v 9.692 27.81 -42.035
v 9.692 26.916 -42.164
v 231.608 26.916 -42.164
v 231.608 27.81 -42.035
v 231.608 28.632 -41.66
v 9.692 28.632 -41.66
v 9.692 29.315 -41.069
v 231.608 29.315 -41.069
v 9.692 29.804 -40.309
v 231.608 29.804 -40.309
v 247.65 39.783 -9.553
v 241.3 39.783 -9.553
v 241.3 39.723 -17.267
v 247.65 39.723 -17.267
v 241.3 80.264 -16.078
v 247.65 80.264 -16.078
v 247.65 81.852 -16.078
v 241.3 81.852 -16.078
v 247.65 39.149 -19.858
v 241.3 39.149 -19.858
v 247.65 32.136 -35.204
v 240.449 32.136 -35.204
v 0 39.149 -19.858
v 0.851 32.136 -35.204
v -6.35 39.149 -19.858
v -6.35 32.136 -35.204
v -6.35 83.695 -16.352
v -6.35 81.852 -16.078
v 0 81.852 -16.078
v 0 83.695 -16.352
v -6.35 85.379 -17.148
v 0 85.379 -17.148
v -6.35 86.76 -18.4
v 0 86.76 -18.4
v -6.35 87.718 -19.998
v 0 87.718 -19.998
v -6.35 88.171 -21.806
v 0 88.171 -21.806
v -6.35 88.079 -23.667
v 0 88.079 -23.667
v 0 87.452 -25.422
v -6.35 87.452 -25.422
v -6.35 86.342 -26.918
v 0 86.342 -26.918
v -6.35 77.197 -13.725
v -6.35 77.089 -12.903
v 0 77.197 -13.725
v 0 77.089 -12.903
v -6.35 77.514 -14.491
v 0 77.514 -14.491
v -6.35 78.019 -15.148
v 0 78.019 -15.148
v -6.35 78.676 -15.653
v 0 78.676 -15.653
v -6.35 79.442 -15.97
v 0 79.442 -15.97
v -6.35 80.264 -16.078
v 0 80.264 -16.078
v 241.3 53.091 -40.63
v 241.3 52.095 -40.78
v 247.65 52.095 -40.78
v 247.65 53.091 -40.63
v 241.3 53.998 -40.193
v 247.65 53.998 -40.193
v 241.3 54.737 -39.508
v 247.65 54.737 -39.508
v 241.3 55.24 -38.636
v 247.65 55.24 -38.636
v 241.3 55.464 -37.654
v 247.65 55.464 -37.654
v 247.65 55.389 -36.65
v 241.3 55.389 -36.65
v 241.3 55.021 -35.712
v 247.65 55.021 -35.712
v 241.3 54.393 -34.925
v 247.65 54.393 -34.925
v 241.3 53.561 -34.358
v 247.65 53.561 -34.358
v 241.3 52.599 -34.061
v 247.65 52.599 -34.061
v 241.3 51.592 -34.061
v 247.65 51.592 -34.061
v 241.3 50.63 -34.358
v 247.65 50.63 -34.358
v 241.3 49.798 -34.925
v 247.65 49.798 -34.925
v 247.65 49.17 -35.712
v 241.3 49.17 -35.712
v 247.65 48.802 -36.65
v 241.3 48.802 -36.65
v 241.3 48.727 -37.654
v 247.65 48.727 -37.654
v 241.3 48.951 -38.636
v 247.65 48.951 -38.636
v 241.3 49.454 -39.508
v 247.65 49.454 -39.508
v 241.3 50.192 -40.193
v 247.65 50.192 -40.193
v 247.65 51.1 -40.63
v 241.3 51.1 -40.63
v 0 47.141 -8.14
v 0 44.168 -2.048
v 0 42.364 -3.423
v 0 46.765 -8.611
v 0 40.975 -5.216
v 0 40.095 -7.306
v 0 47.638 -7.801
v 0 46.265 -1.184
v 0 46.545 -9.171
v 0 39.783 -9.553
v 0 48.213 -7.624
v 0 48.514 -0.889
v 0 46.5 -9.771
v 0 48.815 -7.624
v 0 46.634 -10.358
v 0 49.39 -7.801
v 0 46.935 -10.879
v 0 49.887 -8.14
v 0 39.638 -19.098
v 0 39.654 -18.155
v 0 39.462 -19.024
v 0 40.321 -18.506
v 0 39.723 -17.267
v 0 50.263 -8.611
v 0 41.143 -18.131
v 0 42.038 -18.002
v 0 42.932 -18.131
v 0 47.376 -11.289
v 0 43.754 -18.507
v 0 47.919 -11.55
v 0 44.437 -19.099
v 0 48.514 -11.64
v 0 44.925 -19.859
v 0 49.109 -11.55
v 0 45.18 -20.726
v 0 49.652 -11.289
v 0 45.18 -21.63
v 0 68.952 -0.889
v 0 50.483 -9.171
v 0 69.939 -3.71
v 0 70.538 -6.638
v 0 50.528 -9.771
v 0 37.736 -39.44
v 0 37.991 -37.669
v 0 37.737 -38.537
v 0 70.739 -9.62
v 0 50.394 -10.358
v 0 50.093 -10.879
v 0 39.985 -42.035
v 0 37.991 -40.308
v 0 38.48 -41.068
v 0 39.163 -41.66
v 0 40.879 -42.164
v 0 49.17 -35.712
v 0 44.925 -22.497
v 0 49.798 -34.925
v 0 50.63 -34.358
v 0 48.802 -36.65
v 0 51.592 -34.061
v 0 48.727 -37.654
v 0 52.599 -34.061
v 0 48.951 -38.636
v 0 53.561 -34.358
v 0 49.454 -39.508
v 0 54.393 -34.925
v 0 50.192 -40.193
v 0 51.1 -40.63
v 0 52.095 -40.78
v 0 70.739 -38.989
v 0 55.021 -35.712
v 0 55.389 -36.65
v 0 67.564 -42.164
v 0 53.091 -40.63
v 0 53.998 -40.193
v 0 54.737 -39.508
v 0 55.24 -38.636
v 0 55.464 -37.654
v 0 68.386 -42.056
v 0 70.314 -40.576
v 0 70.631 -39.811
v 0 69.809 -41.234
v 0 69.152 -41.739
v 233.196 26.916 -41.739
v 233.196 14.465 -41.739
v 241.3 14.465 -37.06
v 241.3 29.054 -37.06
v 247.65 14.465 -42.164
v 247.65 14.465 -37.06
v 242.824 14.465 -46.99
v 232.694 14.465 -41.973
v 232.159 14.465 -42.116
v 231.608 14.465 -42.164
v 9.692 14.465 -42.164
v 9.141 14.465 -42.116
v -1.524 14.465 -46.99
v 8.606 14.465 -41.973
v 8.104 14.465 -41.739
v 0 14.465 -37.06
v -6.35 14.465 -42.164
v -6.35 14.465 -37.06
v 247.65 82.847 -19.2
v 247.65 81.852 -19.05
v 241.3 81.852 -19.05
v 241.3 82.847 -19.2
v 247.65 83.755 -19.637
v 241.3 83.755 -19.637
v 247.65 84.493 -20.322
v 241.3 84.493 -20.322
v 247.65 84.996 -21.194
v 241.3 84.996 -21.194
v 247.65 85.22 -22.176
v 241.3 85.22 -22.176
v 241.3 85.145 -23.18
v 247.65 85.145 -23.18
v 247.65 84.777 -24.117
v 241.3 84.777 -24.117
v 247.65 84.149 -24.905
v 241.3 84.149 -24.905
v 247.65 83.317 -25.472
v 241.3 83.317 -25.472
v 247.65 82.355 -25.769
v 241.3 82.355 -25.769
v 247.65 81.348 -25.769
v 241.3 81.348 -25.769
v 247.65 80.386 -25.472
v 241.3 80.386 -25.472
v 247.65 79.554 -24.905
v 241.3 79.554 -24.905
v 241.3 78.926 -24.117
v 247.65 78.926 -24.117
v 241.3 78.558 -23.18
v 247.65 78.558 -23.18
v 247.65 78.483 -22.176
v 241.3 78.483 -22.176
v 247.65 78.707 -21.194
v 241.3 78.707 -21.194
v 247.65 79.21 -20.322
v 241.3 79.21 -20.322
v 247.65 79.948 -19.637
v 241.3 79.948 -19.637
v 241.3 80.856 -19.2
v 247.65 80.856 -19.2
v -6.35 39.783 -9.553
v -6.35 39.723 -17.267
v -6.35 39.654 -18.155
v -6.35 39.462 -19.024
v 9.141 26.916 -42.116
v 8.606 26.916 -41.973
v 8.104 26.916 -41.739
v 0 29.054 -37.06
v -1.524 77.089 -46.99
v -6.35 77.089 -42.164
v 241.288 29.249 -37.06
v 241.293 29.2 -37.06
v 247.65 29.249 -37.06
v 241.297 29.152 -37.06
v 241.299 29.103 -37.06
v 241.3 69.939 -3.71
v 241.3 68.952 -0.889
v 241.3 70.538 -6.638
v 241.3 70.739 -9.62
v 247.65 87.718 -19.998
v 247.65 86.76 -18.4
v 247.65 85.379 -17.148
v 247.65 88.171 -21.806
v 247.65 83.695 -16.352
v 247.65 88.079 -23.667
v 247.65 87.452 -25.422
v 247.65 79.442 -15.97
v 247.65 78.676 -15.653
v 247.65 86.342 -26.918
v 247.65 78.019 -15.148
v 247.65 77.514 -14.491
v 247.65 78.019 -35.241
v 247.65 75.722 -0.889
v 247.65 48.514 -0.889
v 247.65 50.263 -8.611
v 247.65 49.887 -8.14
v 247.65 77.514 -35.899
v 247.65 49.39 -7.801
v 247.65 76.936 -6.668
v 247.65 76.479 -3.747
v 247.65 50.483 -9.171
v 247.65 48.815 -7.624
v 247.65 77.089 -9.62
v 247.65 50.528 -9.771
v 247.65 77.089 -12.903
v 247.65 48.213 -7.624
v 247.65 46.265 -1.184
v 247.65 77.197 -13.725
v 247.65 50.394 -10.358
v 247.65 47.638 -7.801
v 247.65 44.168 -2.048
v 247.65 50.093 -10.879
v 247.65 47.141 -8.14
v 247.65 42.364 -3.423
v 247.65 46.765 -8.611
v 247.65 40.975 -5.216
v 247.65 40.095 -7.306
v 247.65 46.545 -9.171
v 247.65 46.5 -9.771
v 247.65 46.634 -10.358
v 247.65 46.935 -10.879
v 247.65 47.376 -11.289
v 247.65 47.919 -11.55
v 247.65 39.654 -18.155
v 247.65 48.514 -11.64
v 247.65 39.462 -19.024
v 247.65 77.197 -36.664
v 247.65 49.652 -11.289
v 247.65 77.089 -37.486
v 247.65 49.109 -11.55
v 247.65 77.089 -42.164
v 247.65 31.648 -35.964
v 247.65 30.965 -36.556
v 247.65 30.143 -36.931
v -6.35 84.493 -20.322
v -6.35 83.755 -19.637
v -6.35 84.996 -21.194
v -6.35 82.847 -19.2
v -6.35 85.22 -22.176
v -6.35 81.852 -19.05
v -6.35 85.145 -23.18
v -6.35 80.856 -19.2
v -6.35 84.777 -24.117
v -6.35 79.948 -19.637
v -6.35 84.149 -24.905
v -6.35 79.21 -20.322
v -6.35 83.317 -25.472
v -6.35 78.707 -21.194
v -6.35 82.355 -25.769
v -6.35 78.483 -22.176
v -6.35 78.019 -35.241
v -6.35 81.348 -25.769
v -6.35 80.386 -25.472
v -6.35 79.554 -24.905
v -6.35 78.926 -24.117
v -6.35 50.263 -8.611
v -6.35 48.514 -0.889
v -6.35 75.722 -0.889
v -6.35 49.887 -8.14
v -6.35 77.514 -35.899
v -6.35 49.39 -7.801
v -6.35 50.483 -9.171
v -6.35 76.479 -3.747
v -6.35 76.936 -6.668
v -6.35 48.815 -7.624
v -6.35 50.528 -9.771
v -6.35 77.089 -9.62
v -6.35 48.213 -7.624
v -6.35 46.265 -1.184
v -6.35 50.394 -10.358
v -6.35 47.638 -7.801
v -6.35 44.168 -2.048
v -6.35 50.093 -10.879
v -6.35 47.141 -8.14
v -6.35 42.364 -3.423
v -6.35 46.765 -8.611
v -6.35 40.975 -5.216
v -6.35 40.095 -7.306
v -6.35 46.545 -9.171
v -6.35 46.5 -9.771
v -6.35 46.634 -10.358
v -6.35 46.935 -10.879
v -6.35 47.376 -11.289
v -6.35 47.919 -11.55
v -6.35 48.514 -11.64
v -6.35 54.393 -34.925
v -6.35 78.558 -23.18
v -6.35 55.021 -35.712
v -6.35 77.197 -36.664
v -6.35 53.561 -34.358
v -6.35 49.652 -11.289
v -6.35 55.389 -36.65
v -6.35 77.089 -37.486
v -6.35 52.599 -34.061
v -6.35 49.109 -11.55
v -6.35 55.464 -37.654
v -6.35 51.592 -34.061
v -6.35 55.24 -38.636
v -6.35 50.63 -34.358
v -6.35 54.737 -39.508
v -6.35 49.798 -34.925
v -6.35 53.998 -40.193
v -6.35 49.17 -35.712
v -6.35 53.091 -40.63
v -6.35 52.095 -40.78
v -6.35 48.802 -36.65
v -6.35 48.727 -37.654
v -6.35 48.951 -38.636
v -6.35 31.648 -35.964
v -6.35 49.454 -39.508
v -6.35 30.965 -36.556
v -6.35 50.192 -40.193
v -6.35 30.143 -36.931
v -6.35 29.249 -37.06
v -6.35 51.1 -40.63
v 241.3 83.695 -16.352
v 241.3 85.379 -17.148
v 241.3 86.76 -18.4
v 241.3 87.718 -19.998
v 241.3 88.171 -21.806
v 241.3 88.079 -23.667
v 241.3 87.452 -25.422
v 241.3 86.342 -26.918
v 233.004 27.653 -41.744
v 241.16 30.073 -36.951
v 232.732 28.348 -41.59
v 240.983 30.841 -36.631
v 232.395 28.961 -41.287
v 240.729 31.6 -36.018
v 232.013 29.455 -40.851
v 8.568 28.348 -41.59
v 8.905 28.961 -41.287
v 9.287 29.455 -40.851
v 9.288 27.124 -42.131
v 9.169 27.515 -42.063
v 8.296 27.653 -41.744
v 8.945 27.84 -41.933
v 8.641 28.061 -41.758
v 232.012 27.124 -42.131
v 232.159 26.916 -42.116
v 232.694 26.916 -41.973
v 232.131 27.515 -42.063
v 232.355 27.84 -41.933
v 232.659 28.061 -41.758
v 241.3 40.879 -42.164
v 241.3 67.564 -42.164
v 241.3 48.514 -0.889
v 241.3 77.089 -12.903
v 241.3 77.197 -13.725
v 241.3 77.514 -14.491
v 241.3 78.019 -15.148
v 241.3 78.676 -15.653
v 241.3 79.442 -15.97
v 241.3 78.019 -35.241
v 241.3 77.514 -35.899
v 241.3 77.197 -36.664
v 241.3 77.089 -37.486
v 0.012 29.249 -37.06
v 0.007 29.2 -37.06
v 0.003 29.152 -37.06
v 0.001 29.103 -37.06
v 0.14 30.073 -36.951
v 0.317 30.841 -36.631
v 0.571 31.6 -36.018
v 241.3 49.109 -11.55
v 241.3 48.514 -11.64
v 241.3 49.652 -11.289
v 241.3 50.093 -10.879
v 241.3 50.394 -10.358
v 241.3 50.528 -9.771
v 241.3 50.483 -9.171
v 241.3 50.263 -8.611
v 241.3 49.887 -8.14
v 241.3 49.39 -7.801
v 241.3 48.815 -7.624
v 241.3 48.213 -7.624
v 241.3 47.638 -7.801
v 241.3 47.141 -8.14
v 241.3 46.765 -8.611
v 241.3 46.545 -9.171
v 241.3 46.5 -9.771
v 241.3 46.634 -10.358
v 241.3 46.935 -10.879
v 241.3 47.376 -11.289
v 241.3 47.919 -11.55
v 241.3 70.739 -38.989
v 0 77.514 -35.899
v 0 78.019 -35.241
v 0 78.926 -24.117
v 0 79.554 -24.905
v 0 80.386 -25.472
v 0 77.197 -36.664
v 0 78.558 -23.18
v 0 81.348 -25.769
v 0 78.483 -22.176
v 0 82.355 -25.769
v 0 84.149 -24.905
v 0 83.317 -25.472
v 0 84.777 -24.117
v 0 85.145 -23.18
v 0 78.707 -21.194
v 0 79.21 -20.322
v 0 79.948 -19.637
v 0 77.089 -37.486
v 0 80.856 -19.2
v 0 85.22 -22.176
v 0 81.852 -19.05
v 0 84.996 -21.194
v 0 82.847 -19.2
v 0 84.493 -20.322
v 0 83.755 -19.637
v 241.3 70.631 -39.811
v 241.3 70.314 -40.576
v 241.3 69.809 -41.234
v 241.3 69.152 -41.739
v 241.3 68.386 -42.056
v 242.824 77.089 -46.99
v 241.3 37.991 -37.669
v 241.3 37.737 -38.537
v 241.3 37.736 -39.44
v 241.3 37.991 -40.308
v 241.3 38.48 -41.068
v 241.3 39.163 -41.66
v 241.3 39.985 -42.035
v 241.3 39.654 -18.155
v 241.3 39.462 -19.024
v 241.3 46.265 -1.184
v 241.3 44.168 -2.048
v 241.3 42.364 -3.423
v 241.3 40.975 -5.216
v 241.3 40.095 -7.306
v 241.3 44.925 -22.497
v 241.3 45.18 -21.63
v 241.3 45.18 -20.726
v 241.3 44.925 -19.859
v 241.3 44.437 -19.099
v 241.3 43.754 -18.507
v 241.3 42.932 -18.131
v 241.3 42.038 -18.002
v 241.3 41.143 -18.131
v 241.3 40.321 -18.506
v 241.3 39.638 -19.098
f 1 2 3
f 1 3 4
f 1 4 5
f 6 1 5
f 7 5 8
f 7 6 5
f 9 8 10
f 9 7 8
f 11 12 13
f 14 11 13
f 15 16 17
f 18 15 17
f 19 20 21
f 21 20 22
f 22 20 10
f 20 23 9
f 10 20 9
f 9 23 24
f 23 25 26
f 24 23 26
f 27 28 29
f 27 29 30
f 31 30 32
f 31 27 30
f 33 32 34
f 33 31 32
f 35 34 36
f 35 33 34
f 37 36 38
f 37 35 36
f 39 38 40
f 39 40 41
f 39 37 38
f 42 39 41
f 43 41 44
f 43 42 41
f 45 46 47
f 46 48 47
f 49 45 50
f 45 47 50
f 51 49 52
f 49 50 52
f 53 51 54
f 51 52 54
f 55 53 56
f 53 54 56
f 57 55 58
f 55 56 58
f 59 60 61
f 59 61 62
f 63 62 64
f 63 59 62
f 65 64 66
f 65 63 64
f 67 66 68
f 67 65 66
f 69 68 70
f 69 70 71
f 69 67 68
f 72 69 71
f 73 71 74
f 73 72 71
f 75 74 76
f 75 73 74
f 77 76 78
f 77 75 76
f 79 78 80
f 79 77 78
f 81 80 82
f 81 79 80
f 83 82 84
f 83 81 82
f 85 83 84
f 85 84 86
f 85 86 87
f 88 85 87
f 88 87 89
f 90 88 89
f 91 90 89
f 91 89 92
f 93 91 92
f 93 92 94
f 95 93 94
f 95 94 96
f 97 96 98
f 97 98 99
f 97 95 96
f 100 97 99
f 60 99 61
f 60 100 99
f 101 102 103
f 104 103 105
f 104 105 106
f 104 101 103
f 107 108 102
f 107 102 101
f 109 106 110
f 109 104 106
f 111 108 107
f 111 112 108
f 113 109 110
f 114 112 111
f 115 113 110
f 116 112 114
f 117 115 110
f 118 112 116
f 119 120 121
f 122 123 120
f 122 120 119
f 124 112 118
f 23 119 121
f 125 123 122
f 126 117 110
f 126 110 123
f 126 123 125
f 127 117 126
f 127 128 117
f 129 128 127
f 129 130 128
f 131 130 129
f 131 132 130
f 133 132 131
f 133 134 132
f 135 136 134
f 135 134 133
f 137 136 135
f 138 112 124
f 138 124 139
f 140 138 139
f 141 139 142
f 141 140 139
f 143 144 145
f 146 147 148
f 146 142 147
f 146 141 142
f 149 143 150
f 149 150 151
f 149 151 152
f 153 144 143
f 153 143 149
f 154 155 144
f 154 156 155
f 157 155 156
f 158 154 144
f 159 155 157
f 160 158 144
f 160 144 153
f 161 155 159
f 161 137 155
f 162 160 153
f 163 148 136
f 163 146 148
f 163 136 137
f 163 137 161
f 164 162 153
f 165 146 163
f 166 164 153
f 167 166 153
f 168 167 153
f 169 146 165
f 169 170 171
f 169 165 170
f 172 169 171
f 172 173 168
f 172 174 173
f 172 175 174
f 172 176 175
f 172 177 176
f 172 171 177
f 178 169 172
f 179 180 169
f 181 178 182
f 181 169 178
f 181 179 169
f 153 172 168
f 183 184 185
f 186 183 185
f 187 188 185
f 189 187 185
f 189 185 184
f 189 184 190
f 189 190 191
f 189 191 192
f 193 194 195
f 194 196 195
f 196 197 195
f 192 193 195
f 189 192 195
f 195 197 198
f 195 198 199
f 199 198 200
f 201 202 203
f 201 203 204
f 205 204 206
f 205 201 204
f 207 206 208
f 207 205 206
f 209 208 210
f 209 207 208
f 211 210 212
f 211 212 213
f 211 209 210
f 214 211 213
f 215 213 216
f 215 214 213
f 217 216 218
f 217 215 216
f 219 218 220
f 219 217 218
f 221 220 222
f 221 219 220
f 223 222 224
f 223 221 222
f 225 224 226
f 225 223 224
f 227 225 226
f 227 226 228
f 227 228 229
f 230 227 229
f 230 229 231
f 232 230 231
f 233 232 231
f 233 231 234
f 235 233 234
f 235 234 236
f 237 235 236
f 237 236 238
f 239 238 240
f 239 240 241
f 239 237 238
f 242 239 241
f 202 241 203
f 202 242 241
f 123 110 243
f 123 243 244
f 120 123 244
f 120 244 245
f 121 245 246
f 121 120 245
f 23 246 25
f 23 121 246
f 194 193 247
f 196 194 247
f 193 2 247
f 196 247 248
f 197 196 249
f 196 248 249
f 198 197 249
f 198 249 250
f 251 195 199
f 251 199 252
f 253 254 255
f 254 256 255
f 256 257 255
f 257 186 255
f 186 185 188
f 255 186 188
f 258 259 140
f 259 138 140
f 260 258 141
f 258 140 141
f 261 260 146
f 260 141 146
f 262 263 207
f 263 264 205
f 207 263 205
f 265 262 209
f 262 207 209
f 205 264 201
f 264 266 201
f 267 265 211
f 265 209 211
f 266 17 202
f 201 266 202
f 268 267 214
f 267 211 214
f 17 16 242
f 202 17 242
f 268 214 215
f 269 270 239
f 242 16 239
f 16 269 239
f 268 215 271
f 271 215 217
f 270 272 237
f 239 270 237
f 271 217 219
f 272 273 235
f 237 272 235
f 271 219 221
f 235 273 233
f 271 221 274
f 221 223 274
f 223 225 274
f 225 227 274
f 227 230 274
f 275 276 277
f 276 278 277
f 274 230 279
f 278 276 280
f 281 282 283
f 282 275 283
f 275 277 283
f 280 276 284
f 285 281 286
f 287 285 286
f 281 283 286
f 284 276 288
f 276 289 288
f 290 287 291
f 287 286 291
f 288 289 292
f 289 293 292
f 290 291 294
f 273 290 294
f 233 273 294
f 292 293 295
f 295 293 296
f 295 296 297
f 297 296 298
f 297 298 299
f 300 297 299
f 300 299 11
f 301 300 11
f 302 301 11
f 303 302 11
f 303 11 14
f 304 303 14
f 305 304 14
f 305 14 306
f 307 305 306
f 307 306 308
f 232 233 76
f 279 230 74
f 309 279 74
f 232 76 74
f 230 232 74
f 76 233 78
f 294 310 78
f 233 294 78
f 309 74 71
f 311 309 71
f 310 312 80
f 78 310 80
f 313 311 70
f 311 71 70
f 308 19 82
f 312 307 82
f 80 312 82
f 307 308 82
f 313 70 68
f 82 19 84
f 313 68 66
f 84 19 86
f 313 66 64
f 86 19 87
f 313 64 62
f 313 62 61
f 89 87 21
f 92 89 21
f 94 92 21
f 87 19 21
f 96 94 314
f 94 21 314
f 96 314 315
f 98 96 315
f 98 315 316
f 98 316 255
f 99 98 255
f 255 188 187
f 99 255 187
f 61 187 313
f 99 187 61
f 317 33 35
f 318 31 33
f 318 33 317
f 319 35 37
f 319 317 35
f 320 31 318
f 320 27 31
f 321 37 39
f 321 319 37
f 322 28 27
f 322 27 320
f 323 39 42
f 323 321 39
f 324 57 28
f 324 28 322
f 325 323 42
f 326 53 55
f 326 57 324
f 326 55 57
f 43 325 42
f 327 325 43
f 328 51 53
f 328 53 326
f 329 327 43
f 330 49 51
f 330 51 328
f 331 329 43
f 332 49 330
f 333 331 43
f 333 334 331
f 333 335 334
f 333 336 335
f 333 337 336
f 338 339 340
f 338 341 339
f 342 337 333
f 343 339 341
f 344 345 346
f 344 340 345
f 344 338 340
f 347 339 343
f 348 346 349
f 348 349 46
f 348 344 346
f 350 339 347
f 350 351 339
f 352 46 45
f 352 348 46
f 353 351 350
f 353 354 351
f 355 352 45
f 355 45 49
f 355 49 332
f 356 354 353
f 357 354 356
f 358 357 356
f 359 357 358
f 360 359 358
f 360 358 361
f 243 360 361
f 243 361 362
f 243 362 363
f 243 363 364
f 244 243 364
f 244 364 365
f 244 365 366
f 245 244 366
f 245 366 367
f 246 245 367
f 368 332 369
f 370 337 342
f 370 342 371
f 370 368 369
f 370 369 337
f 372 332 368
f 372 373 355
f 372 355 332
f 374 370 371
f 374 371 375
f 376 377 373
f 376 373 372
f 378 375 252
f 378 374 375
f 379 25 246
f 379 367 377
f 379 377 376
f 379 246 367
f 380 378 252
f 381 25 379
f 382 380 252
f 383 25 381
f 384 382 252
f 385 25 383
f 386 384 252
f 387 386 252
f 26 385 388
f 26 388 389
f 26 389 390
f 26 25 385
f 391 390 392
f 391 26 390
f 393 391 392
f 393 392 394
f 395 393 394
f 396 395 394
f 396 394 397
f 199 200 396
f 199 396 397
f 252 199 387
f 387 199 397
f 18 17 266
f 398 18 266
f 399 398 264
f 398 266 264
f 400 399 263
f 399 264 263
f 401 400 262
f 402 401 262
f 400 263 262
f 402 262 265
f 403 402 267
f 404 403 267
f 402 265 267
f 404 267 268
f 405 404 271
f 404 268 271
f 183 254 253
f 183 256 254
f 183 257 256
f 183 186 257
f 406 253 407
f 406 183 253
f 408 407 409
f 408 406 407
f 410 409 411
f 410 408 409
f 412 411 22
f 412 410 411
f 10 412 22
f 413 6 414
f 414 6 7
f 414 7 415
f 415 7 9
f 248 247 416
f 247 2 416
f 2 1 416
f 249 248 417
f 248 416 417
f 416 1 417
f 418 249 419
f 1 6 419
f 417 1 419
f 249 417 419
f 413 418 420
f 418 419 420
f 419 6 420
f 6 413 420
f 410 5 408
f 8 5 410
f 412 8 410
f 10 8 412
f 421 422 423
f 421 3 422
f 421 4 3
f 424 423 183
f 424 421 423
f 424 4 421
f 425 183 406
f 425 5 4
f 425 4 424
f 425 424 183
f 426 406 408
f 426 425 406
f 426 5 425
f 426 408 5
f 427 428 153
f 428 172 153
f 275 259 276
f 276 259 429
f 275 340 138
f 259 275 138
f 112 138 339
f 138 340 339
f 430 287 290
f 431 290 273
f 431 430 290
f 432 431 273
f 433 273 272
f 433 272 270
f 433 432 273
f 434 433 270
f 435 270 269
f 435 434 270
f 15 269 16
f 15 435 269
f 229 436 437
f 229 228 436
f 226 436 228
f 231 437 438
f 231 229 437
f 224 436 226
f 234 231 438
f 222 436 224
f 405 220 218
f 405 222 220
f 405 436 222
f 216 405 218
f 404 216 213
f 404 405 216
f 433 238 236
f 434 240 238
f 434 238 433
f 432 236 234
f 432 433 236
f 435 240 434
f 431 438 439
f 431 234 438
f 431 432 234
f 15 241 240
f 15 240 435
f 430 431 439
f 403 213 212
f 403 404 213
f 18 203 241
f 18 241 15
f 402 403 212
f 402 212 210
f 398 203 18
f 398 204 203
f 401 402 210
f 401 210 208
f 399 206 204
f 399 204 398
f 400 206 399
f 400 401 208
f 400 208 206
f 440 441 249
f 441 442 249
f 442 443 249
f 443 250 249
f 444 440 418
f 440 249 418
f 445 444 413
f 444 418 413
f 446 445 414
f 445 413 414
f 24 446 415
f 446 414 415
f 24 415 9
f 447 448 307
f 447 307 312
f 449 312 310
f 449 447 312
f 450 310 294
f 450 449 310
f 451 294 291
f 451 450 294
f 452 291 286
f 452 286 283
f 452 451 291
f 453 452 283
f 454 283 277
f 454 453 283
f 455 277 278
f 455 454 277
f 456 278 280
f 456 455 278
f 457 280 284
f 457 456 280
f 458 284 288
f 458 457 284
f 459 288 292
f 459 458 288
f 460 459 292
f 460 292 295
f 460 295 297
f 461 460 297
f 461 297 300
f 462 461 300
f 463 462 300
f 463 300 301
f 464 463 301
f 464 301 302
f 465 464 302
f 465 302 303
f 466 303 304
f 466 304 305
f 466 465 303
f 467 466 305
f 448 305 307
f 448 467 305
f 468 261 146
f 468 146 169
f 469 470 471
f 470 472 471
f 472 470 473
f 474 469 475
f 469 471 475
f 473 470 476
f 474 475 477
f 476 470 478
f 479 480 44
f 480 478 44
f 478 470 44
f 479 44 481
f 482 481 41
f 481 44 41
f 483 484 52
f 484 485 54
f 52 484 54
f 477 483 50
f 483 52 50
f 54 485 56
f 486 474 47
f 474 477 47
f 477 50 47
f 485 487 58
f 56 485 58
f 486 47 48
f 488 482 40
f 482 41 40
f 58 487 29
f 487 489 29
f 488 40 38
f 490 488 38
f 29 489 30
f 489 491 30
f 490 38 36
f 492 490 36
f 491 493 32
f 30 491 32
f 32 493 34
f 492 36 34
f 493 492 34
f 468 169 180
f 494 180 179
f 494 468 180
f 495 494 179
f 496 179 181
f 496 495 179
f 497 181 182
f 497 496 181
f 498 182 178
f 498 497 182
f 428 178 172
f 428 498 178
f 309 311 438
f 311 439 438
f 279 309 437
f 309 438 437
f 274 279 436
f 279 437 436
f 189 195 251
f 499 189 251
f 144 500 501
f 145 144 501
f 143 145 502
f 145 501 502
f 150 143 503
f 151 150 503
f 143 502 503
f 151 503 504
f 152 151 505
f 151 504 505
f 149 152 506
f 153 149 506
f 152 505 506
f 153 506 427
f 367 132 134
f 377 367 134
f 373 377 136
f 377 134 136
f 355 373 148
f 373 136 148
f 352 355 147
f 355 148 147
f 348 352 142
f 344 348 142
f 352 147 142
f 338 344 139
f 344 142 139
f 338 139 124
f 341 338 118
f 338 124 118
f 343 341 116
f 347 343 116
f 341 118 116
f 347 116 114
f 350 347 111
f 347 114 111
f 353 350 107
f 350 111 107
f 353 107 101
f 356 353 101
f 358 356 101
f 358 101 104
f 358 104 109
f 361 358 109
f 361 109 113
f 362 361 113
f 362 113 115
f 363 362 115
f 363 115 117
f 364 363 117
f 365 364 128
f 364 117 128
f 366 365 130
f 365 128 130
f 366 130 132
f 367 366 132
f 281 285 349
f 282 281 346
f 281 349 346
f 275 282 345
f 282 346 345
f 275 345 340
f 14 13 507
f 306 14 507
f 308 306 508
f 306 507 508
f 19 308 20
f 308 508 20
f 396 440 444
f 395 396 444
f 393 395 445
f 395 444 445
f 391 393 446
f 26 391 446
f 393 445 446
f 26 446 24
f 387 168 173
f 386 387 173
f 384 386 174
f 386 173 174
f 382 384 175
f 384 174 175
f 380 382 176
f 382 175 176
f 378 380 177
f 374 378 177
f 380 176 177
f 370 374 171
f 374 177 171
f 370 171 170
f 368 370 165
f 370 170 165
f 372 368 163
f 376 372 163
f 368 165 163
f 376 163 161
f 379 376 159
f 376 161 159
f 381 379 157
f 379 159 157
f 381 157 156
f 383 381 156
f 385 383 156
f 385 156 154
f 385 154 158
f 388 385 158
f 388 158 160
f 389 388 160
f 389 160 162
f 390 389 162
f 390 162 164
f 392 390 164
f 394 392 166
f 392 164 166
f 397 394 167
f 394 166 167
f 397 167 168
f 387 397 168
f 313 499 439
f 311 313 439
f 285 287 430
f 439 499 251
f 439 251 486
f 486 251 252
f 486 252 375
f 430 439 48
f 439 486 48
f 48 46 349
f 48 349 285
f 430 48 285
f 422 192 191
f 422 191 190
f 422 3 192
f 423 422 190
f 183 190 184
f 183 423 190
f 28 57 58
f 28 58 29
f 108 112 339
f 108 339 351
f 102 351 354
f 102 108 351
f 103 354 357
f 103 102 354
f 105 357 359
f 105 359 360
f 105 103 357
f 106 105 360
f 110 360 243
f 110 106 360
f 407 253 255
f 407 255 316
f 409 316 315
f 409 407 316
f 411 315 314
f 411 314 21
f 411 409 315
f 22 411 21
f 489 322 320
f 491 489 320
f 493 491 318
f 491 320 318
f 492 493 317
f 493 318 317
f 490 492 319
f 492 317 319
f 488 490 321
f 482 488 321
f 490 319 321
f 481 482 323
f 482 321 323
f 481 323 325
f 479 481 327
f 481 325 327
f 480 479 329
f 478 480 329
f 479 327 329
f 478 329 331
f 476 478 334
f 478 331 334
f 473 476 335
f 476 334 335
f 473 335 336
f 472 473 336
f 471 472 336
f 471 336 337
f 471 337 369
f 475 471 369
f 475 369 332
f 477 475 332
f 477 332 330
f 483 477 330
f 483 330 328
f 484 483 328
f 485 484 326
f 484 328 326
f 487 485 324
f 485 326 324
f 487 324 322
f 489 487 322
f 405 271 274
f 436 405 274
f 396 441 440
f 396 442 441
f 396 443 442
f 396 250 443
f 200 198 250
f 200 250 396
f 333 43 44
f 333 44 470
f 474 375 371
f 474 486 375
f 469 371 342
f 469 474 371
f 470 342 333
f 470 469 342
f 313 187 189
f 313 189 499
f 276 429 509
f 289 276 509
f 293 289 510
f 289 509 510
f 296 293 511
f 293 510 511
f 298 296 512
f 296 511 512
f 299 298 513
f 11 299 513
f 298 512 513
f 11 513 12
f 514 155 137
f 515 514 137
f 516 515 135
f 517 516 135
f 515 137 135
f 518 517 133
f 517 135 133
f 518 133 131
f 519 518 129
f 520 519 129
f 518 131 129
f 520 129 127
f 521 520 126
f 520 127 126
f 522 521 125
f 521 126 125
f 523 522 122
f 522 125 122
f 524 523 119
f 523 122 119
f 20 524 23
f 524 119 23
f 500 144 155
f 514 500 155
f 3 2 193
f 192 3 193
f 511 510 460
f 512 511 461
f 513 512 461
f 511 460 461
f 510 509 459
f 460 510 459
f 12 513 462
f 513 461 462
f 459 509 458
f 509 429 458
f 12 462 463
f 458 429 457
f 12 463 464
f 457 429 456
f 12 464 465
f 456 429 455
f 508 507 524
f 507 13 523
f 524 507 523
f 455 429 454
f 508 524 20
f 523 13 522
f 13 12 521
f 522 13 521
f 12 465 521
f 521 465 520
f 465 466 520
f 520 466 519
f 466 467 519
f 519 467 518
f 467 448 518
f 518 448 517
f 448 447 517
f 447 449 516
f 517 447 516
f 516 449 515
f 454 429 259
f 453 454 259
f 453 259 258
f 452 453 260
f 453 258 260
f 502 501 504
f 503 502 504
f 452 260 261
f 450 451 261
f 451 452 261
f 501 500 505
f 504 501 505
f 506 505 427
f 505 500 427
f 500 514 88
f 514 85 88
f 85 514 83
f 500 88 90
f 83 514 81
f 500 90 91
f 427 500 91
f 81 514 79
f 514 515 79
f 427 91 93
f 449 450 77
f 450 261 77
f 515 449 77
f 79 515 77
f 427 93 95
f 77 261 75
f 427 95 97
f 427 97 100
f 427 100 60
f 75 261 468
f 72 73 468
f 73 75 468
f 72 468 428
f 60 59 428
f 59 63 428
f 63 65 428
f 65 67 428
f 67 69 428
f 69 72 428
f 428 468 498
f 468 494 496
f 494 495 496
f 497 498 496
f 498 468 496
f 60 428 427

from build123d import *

# Parameters (mm, degrees)
SKETCH1_R           = 2.0193
SKETCH1_R_2         = 3.3782
BOSS_EXTRUDE1_DEPTH = 6.35
BOSS_EXTRUDE2_START = 120.65
BOSS_EXTRUDE2_DEPTH = 120.65
BOSS_EXTRUDE3_REACH = 145.827
SKETCH6_R           = 3.3782
BOSS_EXTRUDE4_DEPTH = 6.35
FILLET2_R           = 3.175
CHAMFER1_SIZE       = 4.826


with BuildPart() as part:
    # Sketch1 → Boss-Extrude1 (new body)
    with BuildSketch(Plane(origin=(0, 0, 0), x_dir=(0, 0, -1), z_dir=(1, 0, 0))):
        with BuildLine():
            Line((19.857637877, 39.149224239), (42.164, 28.956))
            Line((42.164, 28.956), (42.164, 14.4653))
            Line((42.164, 14.4653), (46.99, 14.4653))
            Line((46.99, 14.4653), (46.99, 77.089))
            Line((46.99, 77.089), (9.62025, 77.089))
            ThreePointArc((9.62025, 77.089), (5.201472483, 76.745277517), (0.889, 75.722379195))
            Line((0.889, 75.722379195), (0.889, 48.514))
            ThreePointArc((0.889, 48.514), (3.422551022, 42.363938704), (9.552880645, 39.783009911))
            Line((9.552880645, 39.783009911), (17.267409525, 39.723483692))
            ThreePointArc((17.267409525, 39.723483692), (18.59285001, 39.573142424), (19.857637877, 39.149224239))
        make_face()
        with Locations((9.62025, 48.514)):
            Circle(SKETCH1_R, mode=Mode.SUBTRACT)
        with Locations((37.4015, 52.0954)):
            Circle(SKETCH1_R_2, mode=Mode.SUBTRACT)
    extrude(amount=-BOSS_EXTRUDE1_DEPTH)

    # Sketch2 → Boss-Extrude2 (add)
    with BuildSketch(Plane(origin=(0, 0, 0), x_dir=(0, 0, -1), z_dir=(1, 0, 0)).offset(BOSS_EXTRUDE2_START)):
        with BuildLine():
            Line((42.164, 35.93758433), (22.496862123, 44.924775761))
            ThreePointArc((22.496862123, 44.924775761), (18.289474239, 43.356612123), (19.857637877, 39.149224239))
            Line((19.857637877, 39.149224239), (42.164, 28.956))
            Line((42.164, 28.956), (42.164, 14.4653))
            Line((42.164, 14.4653), (46.99, 14.4653))
            Line((46.99, 14.4653), (46.99, 77.089))
            Line((46.99, 77.089), (9.62025, 77.089))
            ThreePointArc((9.62025, 77.089), (5.201472483, 76.745277517), (0.889, 75.722379195))
            Line((0.889, 75.722379195), (0.889, 68.952099188))
            ThreePointArc((0.889, 68.952099188), (5.164137875, 70.287692607), (9.62025, 70.739))
            Line((9.62025, 70.739), (42.164, 70.739))
            Line((42.164, 70.739), (42.164, 35.93758433))
        make_face()
    extrude(amount=-BOSS_EXTRUDE2_DEPTH)

    # Boss-Extrude3: up to this plane
    boss_extrude3_end = Plane(origin=(-6.35, 39.893111336, -18.2297511), z_dir=(0, -0.909535672675175, 0.41562586557060793))
    # Sketch5 → Boss-Extrude3 (add, up to the surface)
    with BuildSketch(Plane.XZ.offset(-14.4653), mode=Mode.PRIVATE) as boss_extrude3_sk1:
        Polygon((-3.858864353, -42.164), (8.841135647, -42.164), (6.8e-08, -37.059567994), (-6.35, -37.059567994), (-6.35, -40.725742164), align=None)
    boss_extrude3_tool1 = split(extrude(boss_extrude3_sk1.sketch, amount=-BOSS_EXTRUDE3_REACH, mode=Mode.PRIVATE), bisect_by=boss_extrude3_end, keep=Keep.BOTH, mode=Mode.PRIVATE)
    add(boss_extrude3_tool1.solids().sort_by_distance((-0.498721, 14.4653, -39.902897))[0])
    # Sketch5 → Boss-Extrude3 (add, up to the surface)
    with BuildSketch(Plane.XZ.offset(-14.4653), mode=Mode.PRIVATE) as boss_extrude3_sk2:
        Polygon((-6.35, -42.164), (-3.858864353, -42.164), (-6.35, -40.725742164), align=None)
    boss_extrude3_tool2 = split(extrude(boss_extrude3_sk2.sketch, amount=-BOSS_EXTRUDE3_REACH, mode=Mode.PRIVATE), bisect_by=boss_extrude3_end, keep=Keep.BOTH, mode=Mode.PRIVATE)
    add(boss_extrude3_tool2.solids().sort_by_distance((-5.519621, 14.4653, -41.684581))[0])

    # Sketch6 → Boss-Extrude4 (add)
    with BuildSketch(Plane.ZY.offset(6.35)):
        with BuildLine():
            Line((-26.918328061, 86.341628061), (-36.170956121, 77.089))
            Line((-36.170956121, 77.089), (-16.0782, 77.089))
            Line((-16.0782, 77.089), (-16.0782, 81.8515))
            ThreePointArc((-16.0782, 81.8515), (-19.998160204, 87.718135031), (-26.918328061, 86.341628061))
        make_face()
        with Locations((-22.4282, 81.8515)):
            Circle(SKETCH6_R, mode=Mode.SUBTRACT)
    extrude(amount=-BOSS_EXTRUDE4_DEPTH)

    # Fillet2
    fillet2_edges = [part.edges().sort_by_distance(p)[0] for p in [
        (60.325, 35.93758433, -42.164),
        (60.325, 70.739, -42.164),
        (64.745567823, 28.956, -42.164),
        (-3.174999966, 31.288546193, -37.059567994),
        (8.841135647, 21.71065, -42.164),
        (4.420567858, 30.122273097, -39.611783997),
        (-3.175, 77.089, -16.0782),
        (-3.175, 77.089, -36.170956121),
    ]]
    fillet(fillet2_edges, radius=FILLET2_R)

    # Mirror1: part across plane


with BuildPart() as part_1:
    add(part.part)
    add(part.part.mirror(Plane(origin=(120.65, 0, 0), x_dir=(0, 0, 1), z_dir=(1, 0, 0))))

    # Chamfer1
    chamfer1_edges = [part_1.edges().sort_by_distance(p)[0] for p in [
        (247.65, 45.77715, -46.99),
        (-6.35, 45.77715, -46.99),
    ]]
    chamfer(chamfer1_edges, length=CHAMFER1_SIZE)


solid = part_1.part
